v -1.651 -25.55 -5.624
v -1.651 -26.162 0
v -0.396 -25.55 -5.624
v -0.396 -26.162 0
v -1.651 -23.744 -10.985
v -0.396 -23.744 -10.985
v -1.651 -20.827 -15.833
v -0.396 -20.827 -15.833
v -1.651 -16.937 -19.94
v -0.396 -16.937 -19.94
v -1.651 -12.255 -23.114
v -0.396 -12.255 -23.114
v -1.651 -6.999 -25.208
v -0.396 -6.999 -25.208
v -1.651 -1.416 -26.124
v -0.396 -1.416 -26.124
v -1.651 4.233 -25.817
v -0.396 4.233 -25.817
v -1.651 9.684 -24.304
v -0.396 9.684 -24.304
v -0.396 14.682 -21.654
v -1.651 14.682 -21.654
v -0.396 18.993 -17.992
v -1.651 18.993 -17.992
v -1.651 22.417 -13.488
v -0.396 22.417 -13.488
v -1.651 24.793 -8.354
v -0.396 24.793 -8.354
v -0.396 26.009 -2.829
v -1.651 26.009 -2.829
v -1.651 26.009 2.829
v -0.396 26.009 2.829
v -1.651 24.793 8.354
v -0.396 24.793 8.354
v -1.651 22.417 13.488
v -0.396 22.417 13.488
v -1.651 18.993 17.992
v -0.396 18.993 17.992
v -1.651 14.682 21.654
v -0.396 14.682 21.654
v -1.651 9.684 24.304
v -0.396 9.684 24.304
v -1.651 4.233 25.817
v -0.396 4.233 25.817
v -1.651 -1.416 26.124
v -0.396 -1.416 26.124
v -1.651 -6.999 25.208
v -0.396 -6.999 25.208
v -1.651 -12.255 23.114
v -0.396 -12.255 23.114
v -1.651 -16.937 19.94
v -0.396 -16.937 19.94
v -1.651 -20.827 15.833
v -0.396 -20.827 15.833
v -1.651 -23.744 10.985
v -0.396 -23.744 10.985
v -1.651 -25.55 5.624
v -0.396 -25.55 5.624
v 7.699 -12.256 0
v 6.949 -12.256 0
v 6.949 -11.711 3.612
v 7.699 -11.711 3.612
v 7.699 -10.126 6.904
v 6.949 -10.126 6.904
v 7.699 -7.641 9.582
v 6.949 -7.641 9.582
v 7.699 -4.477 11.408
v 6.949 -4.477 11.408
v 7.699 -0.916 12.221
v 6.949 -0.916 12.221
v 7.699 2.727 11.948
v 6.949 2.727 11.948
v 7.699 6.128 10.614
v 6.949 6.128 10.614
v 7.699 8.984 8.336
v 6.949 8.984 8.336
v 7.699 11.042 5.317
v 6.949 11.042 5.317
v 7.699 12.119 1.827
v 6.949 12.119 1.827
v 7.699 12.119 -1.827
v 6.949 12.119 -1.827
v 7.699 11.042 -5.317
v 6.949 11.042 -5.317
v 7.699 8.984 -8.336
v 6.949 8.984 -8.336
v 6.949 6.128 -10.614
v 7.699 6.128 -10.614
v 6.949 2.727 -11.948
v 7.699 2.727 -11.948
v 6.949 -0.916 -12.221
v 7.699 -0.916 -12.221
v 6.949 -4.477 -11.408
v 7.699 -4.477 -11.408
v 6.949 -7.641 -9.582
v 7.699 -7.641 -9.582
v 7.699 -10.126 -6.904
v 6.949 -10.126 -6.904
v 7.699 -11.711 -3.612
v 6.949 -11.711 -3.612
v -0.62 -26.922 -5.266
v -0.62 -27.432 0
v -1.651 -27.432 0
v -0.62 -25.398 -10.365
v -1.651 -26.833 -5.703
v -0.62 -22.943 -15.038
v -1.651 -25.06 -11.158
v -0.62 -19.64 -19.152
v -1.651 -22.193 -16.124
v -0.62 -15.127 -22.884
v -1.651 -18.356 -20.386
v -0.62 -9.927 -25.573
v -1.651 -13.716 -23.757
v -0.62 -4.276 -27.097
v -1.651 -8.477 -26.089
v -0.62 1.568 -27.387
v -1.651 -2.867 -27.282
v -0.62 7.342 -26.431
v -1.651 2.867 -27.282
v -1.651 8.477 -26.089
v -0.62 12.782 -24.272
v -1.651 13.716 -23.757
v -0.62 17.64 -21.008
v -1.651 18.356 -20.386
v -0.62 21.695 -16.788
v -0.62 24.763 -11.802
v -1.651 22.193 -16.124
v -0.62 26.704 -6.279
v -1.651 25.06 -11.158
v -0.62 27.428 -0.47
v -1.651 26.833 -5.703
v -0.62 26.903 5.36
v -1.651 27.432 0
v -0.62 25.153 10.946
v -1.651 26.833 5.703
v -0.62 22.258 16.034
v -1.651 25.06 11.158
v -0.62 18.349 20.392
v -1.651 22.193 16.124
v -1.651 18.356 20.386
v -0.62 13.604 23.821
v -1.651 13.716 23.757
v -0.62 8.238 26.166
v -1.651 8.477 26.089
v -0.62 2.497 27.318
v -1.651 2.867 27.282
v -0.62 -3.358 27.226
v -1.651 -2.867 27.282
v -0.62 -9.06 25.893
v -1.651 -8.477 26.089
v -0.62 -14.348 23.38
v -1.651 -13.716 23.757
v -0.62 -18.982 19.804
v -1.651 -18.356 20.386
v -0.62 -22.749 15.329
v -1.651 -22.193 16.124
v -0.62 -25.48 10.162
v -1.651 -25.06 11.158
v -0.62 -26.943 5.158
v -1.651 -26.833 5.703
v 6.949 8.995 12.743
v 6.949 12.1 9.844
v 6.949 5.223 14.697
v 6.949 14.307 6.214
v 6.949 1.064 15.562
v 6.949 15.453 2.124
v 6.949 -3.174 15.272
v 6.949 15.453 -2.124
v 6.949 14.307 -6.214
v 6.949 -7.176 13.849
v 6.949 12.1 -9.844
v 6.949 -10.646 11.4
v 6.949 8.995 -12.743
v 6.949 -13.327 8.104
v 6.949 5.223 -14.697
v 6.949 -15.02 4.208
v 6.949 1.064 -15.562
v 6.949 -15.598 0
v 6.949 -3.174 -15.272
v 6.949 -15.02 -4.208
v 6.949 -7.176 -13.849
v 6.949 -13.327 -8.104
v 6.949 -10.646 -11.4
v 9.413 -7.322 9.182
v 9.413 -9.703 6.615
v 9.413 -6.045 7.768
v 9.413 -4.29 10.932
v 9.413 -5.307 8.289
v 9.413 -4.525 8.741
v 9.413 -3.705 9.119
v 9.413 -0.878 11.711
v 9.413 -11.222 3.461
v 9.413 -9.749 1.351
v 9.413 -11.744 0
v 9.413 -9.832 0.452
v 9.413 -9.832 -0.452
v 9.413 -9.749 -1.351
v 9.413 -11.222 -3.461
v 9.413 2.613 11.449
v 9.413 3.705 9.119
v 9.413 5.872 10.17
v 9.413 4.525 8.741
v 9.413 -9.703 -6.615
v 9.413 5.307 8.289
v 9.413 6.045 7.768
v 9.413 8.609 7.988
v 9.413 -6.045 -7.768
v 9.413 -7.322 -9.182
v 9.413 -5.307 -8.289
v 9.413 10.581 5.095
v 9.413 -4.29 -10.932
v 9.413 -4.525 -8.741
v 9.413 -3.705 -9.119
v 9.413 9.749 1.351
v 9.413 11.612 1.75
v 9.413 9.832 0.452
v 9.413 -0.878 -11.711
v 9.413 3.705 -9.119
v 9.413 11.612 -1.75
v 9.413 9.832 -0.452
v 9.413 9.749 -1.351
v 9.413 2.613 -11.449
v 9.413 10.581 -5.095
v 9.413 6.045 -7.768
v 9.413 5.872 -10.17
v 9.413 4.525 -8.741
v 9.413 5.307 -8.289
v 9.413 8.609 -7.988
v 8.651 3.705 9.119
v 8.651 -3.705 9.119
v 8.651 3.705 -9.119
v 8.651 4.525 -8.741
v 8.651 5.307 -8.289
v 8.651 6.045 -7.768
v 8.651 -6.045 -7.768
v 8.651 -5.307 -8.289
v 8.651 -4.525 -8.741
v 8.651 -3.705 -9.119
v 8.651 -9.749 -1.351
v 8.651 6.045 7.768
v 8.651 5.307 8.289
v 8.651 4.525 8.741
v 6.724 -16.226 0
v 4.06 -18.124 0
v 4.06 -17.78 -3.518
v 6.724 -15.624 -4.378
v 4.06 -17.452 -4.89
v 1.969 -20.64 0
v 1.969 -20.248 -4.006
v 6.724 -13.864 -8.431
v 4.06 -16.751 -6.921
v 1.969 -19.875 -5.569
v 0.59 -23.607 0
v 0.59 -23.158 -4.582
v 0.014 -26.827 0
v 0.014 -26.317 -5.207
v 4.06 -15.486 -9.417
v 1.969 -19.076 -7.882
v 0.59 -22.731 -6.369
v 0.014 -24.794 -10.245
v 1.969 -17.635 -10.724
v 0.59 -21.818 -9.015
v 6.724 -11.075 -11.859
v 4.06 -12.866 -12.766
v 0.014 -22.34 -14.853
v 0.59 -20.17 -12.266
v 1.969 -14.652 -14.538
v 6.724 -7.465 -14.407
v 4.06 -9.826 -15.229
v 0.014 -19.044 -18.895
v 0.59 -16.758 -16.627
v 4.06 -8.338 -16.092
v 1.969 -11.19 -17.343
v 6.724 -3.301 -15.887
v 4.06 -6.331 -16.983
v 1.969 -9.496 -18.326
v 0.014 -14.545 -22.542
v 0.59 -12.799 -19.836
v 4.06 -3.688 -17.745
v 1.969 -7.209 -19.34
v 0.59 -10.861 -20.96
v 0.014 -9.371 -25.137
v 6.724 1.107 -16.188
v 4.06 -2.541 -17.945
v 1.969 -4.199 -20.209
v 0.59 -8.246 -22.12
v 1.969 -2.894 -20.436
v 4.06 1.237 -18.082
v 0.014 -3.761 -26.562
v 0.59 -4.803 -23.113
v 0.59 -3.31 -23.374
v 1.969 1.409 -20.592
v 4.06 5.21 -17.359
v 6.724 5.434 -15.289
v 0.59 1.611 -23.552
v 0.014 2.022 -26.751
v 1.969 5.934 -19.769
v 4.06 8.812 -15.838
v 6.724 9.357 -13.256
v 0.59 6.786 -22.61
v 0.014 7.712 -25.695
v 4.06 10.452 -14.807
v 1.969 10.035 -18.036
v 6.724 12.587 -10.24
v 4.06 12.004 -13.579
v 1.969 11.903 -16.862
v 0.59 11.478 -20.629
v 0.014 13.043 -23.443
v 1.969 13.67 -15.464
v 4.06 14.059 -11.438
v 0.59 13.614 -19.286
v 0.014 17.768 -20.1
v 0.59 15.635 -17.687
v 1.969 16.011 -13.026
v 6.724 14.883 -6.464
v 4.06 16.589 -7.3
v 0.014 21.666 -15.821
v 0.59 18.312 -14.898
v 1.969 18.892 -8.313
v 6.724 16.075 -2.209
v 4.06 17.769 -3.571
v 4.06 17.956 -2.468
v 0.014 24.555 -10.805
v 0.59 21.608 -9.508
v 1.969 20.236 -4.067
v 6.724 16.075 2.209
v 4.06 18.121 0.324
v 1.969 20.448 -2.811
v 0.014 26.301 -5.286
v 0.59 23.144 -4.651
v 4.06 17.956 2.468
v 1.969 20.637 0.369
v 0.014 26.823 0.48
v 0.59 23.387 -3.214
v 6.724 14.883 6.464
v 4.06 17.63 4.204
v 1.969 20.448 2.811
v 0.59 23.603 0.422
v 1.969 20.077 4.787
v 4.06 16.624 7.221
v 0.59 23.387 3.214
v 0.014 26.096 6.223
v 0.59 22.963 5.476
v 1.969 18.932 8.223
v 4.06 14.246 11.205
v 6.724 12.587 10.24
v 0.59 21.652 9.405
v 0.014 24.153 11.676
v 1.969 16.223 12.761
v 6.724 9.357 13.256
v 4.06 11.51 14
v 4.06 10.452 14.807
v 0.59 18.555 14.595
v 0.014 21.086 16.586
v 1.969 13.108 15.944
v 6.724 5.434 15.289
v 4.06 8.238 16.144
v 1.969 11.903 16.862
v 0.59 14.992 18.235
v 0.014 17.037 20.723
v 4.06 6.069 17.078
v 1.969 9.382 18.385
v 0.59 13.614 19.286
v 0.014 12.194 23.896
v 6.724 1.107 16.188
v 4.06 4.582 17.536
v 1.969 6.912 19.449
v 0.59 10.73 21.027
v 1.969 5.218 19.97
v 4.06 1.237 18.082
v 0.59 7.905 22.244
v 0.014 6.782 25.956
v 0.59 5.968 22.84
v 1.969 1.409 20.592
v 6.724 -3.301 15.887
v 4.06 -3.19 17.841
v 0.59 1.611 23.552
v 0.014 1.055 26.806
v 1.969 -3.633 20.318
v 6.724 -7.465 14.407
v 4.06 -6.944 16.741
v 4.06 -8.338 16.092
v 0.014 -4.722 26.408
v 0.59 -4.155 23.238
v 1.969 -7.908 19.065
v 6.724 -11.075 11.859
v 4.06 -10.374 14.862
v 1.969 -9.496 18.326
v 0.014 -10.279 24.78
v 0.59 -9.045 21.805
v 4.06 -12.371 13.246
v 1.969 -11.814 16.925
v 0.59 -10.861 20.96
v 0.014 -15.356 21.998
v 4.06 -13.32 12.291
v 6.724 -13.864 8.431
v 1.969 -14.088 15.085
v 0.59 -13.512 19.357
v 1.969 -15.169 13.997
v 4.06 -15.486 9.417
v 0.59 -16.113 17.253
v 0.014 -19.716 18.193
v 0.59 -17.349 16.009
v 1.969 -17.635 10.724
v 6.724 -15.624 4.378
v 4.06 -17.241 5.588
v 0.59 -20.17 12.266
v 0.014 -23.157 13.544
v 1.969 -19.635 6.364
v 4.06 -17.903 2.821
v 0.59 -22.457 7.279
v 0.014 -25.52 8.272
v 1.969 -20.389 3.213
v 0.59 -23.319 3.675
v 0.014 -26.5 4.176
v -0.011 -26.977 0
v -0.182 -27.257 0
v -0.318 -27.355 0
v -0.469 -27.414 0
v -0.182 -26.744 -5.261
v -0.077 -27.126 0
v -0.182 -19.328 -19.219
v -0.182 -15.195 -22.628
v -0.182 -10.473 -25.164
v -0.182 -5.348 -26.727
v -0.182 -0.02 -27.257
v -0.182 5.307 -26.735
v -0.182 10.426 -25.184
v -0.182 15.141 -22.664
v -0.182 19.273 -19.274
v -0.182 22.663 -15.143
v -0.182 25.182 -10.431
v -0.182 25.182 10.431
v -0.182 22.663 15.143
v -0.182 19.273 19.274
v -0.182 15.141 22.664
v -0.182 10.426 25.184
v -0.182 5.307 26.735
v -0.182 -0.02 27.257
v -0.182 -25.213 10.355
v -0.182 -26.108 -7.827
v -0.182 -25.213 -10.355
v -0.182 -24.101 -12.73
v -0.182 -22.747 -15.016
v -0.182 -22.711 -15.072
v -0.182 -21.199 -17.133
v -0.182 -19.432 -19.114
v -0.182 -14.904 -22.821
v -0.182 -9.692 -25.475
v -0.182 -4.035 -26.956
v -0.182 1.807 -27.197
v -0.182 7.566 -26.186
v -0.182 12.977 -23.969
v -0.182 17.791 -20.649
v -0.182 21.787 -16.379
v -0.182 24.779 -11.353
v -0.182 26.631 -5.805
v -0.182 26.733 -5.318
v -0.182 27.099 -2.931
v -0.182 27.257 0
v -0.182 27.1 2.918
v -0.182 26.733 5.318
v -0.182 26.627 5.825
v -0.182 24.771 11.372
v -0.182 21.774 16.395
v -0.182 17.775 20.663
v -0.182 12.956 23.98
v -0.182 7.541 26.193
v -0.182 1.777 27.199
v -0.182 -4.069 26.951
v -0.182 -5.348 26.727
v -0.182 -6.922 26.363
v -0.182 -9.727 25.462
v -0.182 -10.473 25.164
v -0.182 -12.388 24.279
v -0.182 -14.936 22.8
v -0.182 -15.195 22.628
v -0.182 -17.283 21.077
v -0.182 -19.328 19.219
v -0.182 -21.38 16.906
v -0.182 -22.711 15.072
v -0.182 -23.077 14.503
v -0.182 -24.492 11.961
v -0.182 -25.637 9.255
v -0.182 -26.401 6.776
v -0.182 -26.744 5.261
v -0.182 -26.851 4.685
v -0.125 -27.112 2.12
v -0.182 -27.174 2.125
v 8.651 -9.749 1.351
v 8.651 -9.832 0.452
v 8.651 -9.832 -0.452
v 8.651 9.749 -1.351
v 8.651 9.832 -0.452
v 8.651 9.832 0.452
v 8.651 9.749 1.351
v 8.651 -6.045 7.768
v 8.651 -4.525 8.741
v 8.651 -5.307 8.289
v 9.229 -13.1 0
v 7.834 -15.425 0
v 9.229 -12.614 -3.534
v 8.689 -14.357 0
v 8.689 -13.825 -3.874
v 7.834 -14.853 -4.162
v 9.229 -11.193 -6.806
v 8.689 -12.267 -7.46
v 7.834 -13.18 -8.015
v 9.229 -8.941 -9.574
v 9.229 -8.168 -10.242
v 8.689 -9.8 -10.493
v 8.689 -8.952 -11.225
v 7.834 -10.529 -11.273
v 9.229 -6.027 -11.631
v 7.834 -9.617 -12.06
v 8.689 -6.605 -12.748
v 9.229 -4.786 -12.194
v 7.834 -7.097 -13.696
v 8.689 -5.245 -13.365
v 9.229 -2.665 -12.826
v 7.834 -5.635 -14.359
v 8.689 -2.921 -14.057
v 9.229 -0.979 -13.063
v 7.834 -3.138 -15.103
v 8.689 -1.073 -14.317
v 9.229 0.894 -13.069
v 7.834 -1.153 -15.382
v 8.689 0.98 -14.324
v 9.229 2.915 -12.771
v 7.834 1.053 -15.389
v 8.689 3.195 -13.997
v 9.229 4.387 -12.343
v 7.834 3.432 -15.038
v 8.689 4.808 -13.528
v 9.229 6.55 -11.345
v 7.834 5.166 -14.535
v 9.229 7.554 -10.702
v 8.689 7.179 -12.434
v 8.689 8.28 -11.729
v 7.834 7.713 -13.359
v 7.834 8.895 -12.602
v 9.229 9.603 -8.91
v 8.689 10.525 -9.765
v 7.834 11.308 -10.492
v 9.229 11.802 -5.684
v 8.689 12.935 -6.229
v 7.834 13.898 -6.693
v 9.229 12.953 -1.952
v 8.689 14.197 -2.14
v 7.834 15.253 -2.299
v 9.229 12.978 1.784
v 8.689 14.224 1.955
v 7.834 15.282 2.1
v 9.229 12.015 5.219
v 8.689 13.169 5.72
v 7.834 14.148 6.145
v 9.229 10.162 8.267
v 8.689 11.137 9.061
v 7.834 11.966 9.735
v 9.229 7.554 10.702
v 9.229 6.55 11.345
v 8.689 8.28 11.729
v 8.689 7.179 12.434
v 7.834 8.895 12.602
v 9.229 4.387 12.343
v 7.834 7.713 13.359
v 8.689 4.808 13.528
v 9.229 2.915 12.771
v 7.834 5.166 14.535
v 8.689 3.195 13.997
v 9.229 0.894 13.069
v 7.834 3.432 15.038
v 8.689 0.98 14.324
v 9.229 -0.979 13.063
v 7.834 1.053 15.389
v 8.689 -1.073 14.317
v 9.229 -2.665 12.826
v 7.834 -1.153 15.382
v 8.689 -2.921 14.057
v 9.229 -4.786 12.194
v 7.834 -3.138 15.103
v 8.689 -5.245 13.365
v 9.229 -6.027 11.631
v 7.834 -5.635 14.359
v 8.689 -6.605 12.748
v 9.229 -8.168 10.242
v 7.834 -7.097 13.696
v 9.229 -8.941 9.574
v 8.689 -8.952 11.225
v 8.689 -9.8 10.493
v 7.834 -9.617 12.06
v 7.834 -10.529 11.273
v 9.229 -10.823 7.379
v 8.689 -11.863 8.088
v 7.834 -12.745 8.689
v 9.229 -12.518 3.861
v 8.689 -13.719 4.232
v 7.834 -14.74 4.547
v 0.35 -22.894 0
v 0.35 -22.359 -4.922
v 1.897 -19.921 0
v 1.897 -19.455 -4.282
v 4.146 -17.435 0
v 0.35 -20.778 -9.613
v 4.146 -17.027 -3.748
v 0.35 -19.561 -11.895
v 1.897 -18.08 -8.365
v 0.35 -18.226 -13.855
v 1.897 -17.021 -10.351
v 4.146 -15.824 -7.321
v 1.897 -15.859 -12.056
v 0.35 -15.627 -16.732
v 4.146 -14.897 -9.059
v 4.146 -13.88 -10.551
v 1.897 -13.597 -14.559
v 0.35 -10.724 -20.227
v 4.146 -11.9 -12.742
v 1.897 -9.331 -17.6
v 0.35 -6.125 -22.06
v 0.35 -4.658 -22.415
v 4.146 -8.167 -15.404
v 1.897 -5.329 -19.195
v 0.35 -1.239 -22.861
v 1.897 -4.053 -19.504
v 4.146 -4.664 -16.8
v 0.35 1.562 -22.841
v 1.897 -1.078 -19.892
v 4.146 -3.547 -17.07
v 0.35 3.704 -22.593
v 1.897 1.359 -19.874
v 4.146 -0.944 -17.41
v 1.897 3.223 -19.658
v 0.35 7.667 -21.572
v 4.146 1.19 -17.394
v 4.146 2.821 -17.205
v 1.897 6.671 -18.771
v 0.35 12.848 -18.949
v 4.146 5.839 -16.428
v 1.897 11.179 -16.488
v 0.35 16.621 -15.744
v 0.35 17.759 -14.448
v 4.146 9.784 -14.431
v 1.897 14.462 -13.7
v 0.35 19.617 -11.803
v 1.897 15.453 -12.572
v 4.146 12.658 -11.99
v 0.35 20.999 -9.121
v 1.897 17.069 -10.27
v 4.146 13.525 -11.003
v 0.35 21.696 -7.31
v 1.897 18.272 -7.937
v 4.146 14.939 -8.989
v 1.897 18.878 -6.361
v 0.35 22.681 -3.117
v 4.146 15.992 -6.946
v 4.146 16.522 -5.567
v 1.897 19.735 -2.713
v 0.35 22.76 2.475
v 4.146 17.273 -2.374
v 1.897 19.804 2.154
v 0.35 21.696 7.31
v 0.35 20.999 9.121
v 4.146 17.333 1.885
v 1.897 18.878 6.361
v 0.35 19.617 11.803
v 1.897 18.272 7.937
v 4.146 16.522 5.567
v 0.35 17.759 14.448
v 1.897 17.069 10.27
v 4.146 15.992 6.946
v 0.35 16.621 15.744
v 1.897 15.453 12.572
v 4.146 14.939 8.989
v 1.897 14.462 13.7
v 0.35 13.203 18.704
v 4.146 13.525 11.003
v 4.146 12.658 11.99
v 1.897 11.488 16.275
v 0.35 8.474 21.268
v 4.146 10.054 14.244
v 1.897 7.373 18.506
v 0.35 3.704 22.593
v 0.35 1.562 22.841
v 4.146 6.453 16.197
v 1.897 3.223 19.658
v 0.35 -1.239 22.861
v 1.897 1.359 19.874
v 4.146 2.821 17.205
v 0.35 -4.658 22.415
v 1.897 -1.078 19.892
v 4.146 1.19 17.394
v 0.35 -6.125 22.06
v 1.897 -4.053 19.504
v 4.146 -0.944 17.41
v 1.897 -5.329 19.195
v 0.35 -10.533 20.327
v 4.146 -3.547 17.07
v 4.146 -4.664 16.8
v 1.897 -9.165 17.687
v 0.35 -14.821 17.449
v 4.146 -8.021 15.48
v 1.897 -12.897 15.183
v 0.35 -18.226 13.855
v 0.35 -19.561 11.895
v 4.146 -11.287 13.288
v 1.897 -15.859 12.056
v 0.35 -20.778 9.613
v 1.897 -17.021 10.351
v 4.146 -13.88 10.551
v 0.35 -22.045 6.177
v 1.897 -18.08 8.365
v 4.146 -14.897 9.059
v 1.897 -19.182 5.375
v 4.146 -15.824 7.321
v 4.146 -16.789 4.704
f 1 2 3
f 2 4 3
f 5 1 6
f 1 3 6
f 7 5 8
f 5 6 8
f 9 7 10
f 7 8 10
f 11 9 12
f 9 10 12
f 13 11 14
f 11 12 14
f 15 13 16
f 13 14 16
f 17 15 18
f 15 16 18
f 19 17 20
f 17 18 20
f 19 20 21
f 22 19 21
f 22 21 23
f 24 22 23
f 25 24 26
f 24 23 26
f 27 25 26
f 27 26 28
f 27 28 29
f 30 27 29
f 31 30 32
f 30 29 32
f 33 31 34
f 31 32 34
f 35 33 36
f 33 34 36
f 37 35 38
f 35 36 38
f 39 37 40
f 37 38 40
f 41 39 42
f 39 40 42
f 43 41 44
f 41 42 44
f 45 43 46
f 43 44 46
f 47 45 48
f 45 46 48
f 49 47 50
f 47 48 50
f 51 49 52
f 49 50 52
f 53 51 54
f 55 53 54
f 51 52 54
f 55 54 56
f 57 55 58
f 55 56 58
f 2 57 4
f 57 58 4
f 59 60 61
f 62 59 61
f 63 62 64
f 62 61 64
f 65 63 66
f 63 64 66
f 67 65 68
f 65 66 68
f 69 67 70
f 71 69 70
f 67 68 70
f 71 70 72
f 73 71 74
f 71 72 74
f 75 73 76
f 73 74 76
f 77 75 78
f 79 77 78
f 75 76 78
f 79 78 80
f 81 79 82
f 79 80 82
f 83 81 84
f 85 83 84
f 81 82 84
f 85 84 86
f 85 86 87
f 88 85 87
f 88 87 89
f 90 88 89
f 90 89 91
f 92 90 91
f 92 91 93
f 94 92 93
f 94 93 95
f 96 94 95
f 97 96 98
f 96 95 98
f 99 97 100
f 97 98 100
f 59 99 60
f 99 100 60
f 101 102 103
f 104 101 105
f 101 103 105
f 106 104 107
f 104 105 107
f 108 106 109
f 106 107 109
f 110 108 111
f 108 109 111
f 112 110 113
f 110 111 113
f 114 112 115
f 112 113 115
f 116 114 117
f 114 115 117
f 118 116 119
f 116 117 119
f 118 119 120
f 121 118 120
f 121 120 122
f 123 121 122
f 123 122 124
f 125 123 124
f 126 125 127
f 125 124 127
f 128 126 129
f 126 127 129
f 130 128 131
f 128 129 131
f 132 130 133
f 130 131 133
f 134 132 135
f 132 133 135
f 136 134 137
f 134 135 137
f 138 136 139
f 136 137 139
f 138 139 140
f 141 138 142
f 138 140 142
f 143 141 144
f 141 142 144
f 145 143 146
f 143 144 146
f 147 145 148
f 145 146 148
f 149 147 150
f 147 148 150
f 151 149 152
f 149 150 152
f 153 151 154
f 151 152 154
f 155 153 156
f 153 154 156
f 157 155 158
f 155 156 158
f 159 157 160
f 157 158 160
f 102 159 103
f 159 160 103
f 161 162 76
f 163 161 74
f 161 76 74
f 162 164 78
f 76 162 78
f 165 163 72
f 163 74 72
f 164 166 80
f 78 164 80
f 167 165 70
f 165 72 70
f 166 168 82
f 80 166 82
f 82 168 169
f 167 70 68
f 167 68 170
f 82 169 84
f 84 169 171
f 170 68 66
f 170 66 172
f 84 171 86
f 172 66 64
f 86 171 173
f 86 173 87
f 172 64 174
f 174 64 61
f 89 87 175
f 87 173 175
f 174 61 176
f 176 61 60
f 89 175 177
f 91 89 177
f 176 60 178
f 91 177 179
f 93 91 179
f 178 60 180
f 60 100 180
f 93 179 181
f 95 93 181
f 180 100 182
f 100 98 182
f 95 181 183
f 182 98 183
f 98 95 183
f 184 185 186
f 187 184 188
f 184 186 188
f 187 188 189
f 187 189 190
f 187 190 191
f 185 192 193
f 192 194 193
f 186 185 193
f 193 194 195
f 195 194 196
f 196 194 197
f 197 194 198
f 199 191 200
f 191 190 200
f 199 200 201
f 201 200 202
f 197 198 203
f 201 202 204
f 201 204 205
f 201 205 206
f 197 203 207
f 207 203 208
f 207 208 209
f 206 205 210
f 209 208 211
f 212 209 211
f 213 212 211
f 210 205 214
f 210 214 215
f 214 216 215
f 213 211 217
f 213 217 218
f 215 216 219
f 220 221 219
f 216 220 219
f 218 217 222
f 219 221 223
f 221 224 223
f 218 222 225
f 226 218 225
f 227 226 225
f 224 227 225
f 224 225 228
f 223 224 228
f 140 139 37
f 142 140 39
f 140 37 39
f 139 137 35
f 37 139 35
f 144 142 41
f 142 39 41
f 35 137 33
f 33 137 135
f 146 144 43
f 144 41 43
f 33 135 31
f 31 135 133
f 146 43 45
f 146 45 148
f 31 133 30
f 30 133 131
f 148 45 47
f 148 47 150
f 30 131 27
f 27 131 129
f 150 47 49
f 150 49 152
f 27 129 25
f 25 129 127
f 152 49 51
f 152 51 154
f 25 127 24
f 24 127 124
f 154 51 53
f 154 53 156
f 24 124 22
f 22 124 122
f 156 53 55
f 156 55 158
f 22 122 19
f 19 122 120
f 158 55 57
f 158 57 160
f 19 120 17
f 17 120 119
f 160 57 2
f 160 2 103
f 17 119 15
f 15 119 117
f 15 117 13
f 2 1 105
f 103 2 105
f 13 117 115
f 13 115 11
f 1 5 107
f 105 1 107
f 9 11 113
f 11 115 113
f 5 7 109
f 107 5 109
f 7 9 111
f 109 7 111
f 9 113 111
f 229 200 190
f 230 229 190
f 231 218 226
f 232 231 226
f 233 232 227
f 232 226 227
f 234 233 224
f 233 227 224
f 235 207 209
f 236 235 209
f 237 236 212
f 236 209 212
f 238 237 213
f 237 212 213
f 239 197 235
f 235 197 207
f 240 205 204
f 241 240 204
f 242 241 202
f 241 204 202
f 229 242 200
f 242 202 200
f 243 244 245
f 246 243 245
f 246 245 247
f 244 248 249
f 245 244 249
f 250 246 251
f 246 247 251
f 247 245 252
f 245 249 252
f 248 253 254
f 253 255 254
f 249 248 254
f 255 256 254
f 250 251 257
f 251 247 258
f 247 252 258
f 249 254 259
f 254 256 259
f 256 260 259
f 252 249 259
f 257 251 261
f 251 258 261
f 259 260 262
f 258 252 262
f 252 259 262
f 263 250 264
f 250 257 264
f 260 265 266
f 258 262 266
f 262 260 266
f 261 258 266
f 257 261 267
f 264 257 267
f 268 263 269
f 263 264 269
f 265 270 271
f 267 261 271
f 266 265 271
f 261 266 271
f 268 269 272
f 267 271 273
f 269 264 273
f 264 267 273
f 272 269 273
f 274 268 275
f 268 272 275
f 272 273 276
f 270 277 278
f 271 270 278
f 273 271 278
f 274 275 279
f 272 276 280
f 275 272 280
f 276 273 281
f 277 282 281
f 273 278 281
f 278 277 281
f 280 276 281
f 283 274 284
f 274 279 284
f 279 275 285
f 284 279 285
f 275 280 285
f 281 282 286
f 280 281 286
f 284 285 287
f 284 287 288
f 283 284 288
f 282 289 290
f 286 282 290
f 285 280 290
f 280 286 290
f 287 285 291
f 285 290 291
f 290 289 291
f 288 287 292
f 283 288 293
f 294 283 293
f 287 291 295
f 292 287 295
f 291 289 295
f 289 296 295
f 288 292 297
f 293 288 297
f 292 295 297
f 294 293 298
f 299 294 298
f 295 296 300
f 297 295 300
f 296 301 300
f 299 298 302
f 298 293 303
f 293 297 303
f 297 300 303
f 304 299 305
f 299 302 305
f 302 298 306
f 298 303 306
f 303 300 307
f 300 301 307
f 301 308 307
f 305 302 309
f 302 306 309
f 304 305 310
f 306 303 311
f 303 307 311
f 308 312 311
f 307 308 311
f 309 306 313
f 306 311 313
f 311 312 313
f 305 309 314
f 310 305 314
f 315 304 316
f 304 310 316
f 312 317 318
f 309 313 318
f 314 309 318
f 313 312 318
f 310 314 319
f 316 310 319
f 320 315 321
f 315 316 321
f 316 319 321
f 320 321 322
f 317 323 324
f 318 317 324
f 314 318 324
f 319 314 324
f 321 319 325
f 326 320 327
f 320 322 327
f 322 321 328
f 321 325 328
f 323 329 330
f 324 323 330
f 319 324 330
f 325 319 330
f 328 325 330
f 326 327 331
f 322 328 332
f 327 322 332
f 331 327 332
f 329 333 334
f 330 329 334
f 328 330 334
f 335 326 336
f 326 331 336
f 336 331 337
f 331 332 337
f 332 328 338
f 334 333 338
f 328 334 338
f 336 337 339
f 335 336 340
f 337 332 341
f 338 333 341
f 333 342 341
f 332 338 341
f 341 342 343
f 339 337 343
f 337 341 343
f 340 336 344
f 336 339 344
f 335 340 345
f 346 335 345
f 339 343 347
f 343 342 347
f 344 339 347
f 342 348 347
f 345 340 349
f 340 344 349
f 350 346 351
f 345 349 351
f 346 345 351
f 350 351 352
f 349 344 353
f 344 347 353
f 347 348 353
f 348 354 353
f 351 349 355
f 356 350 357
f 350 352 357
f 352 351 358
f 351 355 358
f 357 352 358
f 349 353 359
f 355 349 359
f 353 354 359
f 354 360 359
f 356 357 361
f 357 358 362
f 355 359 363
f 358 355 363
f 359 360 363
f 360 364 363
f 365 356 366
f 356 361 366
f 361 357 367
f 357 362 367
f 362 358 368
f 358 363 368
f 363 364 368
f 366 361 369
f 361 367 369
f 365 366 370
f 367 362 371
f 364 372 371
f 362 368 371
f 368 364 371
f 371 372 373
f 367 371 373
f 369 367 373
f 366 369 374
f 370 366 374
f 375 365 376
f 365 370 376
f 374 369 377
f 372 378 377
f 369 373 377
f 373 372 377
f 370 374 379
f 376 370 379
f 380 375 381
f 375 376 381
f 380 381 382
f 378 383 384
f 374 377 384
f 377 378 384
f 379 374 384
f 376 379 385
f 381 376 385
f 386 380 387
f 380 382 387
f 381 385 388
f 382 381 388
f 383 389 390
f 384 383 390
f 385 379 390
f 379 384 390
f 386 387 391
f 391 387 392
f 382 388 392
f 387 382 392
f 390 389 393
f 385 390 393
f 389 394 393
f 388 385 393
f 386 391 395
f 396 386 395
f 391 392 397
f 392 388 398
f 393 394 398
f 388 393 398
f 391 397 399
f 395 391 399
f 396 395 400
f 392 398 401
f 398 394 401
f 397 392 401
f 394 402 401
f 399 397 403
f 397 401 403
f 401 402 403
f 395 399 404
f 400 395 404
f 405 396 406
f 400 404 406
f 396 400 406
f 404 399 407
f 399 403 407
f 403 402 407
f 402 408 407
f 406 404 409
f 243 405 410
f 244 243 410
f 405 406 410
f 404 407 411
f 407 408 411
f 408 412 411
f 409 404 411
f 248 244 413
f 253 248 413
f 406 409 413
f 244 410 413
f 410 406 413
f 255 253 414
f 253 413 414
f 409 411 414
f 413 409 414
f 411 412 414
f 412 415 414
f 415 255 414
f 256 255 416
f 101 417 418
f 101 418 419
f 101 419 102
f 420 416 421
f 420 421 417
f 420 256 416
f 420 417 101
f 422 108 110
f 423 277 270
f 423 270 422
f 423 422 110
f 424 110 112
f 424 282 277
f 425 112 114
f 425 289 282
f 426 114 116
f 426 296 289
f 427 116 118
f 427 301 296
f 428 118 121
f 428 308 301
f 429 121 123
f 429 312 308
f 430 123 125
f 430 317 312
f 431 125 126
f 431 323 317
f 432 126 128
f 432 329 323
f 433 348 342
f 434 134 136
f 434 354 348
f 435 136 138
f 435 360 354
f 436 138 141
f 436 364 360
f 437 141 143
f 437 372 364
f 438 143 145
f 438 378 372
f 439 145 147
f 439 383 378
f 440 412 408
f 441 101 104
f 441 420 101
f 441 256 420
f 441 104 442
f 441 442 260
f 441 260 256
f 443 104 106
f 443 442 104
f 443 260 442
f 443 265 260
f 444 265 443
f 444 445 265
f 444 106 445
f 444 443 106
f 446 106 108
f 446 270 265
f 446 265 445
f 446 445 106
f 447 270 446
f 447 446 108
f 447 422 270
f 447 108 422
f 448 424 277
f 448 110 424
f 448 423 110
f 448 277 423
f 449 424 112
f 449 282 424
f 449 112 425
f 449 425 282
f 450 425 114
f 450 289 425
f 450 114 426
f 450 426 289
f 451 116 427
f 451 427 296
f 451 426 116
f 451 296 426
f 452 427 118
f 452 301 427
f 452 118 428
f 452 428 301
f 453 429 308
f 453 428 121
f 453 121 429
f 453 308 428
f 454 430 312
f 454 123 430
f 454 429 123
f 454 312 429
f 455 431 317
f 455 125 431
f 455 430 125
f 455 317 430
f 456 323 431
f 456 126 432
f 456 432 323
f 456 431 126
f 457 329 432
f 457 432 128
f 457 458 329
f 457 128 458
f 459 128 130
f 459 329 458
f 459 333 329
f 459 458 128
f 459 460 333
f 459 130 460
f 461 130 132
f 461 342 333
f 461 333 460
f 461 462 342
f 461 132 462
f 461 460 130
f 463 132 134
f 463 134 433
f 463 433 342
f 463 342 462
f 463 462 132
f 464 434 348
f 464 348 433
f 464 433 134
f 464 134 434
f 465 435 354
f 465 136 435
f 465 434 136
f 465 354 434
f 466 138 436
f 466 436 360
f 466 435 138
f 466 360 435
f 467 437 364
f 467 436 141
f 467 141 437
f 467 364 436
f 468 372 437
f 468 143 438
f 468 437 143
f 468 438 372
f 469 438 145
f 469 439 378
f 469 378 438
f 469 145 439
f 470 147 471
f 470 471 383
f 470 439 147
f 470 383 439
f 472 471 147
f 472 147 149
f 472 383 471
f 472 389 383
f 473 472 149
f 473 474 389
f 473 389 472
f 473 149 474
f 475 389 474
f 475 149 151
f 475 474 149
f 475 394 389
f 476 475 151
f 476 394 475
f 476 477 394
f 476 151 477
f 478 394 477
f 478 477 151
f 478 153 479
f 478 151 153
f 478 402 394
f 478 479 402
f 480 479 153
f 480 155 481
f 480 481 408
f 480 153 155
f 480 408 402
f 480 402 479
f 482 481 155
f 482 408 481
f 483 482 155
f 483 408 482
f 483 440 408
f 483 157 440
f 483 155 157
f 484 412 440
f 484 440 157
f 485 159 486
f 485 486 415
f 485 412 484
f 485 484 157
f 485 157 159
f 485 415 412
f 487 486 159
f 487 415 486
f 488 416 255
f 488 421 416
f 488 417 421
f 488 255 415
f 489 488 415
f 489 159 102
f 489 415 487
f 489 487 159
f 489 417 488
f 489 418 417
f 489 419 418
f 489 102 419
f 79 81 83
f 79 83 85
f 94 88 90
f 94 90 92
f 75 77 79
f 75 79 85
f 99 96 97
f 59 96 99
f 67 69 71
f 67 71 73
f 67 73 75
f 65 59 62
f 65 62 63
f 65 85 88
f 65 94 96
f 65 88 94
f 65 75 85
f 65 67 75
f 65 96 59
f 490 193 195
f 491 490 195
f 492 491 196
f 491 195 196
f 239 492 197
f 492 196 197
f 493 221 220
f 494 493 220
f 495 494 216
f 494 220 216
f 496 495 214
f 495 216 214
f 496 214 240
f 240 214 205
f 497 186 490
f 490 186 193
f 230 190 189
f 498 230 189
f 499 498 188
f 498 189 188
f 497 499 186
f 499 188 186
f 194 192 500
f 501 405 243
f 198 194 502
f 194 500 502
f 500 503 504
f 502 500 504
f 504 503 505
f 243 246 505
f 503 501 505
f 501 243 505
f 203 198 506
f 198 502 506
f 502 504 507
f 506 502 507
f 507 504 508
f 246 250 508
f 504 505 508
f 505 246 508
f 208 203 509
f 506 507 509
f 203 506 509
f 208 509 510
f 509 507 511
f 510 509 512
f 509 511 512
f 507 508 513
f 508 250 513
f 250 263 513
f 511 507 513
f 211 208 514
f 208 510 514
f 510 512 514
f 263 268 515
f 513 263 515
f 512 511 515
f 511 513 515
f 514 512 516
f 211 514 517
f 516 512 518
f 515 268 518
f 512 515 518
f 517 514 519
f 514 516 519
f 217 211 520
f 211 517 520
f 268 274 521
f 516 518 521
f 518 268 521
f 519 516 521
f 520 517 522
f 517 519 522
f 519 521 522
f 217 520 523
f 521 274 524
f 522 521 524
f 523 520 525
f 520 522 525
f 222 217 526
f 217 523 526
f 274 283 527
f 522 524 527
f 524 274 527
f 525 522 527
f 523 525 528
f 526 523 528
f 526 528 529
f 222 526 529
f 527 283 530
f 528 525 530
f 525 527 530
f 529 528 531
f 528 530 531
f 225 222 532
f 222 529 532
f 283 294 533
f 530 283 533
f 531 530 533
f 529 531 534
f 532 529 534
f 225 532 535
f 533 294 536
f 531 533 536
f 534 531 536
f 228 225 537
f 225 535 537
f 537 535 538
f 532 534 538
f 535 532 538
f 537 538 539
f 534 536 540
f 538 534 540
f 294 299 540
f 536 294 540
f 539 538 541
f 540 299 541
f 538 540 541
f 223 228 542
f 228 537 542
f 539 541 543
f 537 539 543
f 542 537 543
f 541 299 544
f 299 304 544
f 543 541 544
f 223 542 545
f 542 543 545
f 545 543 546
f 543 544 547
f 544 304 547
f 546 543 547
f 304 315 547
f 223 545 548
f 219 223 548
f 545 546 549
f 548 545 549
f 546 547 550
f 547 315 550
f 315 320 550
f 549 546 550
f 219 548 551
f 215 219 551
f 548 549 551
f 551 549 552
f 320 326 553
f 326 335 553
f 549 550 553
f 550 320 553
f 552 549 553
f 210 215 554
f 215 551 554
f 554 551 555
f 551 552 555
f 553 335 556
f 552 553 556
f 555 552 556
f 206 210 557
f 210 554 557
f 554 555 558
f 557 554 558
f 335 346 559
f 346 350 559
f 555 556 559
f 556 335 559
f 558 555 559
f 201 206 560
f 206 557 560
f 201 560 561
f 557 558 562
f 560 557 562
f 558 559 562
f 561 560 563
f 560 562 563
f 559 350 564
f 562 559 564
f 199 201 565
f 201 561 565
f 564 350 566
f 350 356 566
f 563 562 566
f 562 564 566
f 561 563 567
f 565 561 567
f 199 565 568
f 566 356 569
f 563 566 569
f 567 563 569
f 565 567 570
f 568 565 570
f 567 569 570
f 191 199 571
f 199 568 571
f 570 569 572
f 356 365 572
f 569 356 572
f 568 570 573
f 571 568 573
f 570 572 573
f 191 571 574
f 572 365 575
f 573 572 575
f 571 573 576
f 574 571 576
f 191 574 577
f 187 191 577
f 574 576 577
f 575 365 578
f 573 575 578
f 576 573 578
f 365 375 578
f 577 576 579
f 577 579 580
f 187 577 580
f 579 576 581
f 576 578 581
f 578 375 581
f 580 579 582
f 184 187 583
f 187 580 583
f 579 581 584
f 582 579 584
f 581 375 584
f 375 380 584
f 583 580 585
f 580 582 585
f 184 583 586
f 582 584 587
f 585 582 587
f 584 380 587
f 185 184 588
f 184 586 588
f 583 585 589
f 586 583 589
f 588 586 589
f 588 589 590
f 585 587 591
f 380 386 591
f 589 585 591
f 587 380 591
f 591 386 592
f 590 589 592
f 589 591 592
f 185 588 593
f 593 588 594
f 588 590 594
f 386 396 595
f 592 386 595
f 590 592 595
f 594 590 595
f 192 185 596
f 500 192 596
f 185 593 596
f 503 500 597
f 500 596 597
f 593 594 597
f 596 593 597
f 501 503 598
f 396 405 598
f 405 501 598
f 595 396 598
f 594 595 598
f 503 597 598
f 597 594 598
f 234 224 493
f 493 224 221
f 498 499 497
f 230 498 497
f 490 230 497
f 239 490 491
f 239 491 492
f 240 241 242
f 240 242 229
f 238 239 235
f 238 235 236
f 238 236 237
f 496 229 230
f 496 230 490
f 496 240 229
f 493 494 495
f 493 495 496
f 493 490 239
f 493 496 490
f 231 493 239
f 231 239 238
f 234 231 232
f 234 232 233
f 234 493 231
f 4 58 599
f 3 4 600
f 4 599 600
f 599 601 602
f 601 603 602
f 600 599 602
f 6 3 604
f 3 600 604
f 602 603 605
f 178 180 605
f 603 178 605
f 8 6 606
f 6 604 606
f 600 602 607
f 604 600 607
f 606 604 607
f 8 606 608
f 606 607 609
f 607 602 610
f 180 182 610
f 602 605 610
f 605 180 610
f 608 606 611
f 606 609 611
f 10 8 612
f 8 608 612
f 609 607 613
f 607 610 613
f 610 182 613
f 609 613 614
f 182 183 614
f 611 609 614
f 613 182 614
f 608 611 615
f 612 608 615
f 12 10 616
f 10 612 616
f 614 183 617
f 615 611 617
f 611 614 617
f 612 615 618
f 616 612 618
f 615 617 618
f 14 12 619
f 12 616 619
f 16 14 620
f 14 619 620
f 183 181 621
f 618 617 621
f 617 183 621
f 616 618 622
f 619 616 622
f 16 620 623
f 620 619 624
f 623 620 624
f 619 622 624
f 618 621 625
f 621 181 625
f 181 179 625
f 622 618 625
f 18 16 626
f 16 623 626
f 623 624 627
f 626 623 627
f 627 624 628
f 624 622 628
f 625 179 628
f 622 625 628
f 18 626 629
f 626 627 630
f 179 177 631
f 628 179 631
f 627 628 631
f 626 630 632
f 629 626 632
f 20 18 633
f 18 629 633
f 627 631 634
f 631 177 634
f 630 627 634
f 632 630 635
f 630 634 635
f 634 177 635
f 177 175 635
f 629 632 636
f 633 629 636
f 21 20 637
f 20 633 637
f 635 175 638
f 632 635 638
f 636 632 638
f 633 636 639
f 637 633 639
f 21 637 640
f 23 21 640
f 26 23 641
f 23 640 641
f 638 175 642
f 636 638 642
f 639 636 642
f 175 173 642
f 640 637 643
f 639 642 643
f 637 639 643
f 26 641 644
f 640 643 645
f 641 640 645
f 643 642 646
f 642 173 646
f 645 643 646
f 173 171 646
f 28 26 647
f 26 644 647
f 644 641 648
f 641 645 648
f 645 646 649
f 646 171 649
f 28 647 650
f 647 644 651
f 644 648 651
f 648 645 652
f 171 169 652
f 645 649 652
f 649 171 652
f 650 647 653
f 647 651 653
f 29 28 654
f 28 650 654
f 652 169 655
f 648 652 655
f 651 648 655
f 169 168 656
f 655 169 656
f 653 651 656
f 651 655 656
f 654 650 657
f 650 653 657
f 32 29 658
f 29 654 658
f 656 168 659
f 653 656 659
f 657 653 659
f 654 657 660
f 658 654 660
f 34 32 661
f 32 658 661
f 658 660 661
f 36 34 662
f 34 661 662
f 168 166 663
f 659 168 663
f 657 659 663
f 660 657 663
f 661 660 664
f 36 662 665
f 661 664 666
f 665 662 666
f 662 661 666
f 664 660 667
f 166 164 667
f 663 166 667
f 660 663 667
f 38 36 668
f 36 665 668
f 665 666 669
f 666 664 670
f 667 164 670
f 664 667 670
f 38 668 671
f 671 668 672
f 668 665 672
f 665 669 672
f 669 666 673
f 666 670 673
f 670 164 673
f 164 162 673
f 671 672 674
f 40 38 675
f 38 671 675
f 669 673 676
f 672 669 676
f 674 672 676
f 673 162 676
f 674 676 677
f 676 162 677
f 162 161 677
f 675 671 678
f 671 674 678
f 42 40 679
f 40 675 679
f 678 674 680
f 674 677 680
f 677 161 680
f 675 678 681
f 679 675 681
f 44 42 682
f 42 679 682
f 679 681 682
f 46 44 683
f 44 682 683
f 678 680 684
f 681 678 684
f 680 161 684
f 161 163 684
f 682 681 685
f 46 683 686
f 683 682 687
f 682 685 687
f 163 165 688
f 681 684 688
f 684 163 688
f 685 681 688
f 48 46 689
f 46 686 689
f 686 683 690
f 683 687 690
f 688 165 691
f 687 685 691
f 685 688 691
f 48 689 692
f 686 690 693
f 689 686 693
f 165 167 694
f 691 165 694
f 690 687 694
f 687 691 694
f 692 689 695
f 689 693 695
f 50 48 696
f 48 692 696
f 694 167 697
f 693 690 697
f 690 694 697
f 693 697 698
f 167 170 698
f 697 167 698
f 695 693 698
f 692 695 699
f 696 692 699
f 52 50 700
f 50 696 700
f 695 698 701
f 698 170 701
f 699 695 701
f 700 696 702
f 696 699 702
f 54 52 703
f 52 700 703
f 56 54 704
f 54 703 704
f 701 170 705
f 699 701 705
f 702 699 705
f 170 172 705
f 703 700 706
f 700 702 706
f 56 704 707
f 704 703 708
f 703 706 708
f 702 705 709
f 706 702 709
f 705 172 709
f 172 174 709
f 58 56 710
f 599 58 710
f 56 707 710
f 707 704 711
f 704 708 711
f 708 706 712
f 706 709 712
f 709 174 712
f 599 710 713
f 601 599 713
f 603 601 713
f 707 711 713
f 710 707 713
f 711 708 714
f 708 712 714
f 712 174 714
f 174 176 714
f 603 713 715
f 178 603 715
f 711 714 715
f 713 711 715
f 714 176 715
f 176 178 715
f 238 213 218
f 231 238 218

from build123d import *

# Parameters (mm, degrees)
HEX_2_DEPTH       = 0.762
SKETCH4_R         = 12.2555
BACK_RECESS_DEPTH = 0.7493
FILLET1_R         = 0.635


with BuildPart() as part:
    # Sketch1 → Main Body (revolve)
    with BuildSketch(Plane.XY, mode=Mode.PRIVATE) as main_body_sk:
        with BuildLine():
            Line((6.949434781, 0), (9.413234781, 0))
            Line((9.413234781, 0), (9.413234781, 11.743608121))
            ThreePointArc((9.413234781, 11.743608121), (8.689274386, 14.357287319), (6.723739129, 16.2260058))
            ThreePointArc((6.723739129, 16.2260058), (1.809900986, 20.897802003), (0, 27.432))
            Line((0, 27.432), (-1.651, 27.432))
            Line((-1.651, 27.432), (-1.651, 26.162))
            Line((-1.651, 26.162), (-0.395763126, 26.162))
            ThreePointArc((-0.395763126, 26.162), (1.897435342, 19.920907626), (6.949434781, 15.598027231))
            Line((6.949434781, 15.598027231), (6.949434781, 0))
        make_face()
    revolve(main_body_sk.sketch.rotate(Axis((6.949434781, 0, 0), (1, 0, 0)), 180), axis=Axis((6.949434781, 0, 0), (1, 0, 0)))

    # Sketch3 → Hex 2 (cut)
    with BuildSketch(Plane(origin=(9.413234781, 0, 0), x_dir=(0, 0, -1), z_dir=(1, 0, 0))):
        with BuildLine():
            Line((-9.1186, 3.704853612), (-9.1186, -3.704853612))
            ThreePointArc((-9.1186, -3.704853612), (-8.523855037, -4.92125), (-7.767797346, -6.044512441))
            Line((-7.767797346, -6.044512441), (-1.350802654, -9.749366053))
            ThreePointArc((-1.350802654, -9.749366053), (0, -9.8425), (1.350802654, -9.749366053))
            Line((1.350802654, -9.749366053), (7.767797346, -6.044512441))
            ThreePointArc((7.767797346, -6.044512441), (8.523855037, -4.92125), (9.1186, -3.704853612))
            Line((9.1186, -3.704853612), (9.1186, 3.704853612))
            ThreePointArc((9.1186, 3.704853612), (8.523855037, 4.92125), (7.767797346, 6.044512441))
            Line((7.767797346, 6.044512441), (1.350802654, 9.749366053))
            ThreePointArc((1.350802654, 9.749366053), (0, 9.8425), (-1.350802654, 9.749366053))
            Line((-1.350802654, 9.749366053), (-7.767797346, 6.044512441))
            ThreePointArc((-7.767797346, 6.044512441), (-8.523855037, 4.92125), (-9.1186, 3.704853612))
        make_face()
    extrude(amount=-HEX_2_DEPTH, mode=Mode.SUBTRACT)

    # Sketch4 → Back Recess (cut)
    with BuildSketch(Plane.ZY.offset(-6.949434781)):
        with Locations(Location((0, 0, 0), (0, 0, 270))):
            Circle(SKETCH4_R)
    extrude(amount=-BACK_RECESS_DEPTH, mode=Mode.SUBTRACT)

    # Fillet1
    fillet1_edges = [part.edges().sort_by_distance(p)[0] for p in [
        (0, 27.432, 0),
    ]]
    fillet(fillet1_edges, radius=FILLET1_R)


solid = part.part
